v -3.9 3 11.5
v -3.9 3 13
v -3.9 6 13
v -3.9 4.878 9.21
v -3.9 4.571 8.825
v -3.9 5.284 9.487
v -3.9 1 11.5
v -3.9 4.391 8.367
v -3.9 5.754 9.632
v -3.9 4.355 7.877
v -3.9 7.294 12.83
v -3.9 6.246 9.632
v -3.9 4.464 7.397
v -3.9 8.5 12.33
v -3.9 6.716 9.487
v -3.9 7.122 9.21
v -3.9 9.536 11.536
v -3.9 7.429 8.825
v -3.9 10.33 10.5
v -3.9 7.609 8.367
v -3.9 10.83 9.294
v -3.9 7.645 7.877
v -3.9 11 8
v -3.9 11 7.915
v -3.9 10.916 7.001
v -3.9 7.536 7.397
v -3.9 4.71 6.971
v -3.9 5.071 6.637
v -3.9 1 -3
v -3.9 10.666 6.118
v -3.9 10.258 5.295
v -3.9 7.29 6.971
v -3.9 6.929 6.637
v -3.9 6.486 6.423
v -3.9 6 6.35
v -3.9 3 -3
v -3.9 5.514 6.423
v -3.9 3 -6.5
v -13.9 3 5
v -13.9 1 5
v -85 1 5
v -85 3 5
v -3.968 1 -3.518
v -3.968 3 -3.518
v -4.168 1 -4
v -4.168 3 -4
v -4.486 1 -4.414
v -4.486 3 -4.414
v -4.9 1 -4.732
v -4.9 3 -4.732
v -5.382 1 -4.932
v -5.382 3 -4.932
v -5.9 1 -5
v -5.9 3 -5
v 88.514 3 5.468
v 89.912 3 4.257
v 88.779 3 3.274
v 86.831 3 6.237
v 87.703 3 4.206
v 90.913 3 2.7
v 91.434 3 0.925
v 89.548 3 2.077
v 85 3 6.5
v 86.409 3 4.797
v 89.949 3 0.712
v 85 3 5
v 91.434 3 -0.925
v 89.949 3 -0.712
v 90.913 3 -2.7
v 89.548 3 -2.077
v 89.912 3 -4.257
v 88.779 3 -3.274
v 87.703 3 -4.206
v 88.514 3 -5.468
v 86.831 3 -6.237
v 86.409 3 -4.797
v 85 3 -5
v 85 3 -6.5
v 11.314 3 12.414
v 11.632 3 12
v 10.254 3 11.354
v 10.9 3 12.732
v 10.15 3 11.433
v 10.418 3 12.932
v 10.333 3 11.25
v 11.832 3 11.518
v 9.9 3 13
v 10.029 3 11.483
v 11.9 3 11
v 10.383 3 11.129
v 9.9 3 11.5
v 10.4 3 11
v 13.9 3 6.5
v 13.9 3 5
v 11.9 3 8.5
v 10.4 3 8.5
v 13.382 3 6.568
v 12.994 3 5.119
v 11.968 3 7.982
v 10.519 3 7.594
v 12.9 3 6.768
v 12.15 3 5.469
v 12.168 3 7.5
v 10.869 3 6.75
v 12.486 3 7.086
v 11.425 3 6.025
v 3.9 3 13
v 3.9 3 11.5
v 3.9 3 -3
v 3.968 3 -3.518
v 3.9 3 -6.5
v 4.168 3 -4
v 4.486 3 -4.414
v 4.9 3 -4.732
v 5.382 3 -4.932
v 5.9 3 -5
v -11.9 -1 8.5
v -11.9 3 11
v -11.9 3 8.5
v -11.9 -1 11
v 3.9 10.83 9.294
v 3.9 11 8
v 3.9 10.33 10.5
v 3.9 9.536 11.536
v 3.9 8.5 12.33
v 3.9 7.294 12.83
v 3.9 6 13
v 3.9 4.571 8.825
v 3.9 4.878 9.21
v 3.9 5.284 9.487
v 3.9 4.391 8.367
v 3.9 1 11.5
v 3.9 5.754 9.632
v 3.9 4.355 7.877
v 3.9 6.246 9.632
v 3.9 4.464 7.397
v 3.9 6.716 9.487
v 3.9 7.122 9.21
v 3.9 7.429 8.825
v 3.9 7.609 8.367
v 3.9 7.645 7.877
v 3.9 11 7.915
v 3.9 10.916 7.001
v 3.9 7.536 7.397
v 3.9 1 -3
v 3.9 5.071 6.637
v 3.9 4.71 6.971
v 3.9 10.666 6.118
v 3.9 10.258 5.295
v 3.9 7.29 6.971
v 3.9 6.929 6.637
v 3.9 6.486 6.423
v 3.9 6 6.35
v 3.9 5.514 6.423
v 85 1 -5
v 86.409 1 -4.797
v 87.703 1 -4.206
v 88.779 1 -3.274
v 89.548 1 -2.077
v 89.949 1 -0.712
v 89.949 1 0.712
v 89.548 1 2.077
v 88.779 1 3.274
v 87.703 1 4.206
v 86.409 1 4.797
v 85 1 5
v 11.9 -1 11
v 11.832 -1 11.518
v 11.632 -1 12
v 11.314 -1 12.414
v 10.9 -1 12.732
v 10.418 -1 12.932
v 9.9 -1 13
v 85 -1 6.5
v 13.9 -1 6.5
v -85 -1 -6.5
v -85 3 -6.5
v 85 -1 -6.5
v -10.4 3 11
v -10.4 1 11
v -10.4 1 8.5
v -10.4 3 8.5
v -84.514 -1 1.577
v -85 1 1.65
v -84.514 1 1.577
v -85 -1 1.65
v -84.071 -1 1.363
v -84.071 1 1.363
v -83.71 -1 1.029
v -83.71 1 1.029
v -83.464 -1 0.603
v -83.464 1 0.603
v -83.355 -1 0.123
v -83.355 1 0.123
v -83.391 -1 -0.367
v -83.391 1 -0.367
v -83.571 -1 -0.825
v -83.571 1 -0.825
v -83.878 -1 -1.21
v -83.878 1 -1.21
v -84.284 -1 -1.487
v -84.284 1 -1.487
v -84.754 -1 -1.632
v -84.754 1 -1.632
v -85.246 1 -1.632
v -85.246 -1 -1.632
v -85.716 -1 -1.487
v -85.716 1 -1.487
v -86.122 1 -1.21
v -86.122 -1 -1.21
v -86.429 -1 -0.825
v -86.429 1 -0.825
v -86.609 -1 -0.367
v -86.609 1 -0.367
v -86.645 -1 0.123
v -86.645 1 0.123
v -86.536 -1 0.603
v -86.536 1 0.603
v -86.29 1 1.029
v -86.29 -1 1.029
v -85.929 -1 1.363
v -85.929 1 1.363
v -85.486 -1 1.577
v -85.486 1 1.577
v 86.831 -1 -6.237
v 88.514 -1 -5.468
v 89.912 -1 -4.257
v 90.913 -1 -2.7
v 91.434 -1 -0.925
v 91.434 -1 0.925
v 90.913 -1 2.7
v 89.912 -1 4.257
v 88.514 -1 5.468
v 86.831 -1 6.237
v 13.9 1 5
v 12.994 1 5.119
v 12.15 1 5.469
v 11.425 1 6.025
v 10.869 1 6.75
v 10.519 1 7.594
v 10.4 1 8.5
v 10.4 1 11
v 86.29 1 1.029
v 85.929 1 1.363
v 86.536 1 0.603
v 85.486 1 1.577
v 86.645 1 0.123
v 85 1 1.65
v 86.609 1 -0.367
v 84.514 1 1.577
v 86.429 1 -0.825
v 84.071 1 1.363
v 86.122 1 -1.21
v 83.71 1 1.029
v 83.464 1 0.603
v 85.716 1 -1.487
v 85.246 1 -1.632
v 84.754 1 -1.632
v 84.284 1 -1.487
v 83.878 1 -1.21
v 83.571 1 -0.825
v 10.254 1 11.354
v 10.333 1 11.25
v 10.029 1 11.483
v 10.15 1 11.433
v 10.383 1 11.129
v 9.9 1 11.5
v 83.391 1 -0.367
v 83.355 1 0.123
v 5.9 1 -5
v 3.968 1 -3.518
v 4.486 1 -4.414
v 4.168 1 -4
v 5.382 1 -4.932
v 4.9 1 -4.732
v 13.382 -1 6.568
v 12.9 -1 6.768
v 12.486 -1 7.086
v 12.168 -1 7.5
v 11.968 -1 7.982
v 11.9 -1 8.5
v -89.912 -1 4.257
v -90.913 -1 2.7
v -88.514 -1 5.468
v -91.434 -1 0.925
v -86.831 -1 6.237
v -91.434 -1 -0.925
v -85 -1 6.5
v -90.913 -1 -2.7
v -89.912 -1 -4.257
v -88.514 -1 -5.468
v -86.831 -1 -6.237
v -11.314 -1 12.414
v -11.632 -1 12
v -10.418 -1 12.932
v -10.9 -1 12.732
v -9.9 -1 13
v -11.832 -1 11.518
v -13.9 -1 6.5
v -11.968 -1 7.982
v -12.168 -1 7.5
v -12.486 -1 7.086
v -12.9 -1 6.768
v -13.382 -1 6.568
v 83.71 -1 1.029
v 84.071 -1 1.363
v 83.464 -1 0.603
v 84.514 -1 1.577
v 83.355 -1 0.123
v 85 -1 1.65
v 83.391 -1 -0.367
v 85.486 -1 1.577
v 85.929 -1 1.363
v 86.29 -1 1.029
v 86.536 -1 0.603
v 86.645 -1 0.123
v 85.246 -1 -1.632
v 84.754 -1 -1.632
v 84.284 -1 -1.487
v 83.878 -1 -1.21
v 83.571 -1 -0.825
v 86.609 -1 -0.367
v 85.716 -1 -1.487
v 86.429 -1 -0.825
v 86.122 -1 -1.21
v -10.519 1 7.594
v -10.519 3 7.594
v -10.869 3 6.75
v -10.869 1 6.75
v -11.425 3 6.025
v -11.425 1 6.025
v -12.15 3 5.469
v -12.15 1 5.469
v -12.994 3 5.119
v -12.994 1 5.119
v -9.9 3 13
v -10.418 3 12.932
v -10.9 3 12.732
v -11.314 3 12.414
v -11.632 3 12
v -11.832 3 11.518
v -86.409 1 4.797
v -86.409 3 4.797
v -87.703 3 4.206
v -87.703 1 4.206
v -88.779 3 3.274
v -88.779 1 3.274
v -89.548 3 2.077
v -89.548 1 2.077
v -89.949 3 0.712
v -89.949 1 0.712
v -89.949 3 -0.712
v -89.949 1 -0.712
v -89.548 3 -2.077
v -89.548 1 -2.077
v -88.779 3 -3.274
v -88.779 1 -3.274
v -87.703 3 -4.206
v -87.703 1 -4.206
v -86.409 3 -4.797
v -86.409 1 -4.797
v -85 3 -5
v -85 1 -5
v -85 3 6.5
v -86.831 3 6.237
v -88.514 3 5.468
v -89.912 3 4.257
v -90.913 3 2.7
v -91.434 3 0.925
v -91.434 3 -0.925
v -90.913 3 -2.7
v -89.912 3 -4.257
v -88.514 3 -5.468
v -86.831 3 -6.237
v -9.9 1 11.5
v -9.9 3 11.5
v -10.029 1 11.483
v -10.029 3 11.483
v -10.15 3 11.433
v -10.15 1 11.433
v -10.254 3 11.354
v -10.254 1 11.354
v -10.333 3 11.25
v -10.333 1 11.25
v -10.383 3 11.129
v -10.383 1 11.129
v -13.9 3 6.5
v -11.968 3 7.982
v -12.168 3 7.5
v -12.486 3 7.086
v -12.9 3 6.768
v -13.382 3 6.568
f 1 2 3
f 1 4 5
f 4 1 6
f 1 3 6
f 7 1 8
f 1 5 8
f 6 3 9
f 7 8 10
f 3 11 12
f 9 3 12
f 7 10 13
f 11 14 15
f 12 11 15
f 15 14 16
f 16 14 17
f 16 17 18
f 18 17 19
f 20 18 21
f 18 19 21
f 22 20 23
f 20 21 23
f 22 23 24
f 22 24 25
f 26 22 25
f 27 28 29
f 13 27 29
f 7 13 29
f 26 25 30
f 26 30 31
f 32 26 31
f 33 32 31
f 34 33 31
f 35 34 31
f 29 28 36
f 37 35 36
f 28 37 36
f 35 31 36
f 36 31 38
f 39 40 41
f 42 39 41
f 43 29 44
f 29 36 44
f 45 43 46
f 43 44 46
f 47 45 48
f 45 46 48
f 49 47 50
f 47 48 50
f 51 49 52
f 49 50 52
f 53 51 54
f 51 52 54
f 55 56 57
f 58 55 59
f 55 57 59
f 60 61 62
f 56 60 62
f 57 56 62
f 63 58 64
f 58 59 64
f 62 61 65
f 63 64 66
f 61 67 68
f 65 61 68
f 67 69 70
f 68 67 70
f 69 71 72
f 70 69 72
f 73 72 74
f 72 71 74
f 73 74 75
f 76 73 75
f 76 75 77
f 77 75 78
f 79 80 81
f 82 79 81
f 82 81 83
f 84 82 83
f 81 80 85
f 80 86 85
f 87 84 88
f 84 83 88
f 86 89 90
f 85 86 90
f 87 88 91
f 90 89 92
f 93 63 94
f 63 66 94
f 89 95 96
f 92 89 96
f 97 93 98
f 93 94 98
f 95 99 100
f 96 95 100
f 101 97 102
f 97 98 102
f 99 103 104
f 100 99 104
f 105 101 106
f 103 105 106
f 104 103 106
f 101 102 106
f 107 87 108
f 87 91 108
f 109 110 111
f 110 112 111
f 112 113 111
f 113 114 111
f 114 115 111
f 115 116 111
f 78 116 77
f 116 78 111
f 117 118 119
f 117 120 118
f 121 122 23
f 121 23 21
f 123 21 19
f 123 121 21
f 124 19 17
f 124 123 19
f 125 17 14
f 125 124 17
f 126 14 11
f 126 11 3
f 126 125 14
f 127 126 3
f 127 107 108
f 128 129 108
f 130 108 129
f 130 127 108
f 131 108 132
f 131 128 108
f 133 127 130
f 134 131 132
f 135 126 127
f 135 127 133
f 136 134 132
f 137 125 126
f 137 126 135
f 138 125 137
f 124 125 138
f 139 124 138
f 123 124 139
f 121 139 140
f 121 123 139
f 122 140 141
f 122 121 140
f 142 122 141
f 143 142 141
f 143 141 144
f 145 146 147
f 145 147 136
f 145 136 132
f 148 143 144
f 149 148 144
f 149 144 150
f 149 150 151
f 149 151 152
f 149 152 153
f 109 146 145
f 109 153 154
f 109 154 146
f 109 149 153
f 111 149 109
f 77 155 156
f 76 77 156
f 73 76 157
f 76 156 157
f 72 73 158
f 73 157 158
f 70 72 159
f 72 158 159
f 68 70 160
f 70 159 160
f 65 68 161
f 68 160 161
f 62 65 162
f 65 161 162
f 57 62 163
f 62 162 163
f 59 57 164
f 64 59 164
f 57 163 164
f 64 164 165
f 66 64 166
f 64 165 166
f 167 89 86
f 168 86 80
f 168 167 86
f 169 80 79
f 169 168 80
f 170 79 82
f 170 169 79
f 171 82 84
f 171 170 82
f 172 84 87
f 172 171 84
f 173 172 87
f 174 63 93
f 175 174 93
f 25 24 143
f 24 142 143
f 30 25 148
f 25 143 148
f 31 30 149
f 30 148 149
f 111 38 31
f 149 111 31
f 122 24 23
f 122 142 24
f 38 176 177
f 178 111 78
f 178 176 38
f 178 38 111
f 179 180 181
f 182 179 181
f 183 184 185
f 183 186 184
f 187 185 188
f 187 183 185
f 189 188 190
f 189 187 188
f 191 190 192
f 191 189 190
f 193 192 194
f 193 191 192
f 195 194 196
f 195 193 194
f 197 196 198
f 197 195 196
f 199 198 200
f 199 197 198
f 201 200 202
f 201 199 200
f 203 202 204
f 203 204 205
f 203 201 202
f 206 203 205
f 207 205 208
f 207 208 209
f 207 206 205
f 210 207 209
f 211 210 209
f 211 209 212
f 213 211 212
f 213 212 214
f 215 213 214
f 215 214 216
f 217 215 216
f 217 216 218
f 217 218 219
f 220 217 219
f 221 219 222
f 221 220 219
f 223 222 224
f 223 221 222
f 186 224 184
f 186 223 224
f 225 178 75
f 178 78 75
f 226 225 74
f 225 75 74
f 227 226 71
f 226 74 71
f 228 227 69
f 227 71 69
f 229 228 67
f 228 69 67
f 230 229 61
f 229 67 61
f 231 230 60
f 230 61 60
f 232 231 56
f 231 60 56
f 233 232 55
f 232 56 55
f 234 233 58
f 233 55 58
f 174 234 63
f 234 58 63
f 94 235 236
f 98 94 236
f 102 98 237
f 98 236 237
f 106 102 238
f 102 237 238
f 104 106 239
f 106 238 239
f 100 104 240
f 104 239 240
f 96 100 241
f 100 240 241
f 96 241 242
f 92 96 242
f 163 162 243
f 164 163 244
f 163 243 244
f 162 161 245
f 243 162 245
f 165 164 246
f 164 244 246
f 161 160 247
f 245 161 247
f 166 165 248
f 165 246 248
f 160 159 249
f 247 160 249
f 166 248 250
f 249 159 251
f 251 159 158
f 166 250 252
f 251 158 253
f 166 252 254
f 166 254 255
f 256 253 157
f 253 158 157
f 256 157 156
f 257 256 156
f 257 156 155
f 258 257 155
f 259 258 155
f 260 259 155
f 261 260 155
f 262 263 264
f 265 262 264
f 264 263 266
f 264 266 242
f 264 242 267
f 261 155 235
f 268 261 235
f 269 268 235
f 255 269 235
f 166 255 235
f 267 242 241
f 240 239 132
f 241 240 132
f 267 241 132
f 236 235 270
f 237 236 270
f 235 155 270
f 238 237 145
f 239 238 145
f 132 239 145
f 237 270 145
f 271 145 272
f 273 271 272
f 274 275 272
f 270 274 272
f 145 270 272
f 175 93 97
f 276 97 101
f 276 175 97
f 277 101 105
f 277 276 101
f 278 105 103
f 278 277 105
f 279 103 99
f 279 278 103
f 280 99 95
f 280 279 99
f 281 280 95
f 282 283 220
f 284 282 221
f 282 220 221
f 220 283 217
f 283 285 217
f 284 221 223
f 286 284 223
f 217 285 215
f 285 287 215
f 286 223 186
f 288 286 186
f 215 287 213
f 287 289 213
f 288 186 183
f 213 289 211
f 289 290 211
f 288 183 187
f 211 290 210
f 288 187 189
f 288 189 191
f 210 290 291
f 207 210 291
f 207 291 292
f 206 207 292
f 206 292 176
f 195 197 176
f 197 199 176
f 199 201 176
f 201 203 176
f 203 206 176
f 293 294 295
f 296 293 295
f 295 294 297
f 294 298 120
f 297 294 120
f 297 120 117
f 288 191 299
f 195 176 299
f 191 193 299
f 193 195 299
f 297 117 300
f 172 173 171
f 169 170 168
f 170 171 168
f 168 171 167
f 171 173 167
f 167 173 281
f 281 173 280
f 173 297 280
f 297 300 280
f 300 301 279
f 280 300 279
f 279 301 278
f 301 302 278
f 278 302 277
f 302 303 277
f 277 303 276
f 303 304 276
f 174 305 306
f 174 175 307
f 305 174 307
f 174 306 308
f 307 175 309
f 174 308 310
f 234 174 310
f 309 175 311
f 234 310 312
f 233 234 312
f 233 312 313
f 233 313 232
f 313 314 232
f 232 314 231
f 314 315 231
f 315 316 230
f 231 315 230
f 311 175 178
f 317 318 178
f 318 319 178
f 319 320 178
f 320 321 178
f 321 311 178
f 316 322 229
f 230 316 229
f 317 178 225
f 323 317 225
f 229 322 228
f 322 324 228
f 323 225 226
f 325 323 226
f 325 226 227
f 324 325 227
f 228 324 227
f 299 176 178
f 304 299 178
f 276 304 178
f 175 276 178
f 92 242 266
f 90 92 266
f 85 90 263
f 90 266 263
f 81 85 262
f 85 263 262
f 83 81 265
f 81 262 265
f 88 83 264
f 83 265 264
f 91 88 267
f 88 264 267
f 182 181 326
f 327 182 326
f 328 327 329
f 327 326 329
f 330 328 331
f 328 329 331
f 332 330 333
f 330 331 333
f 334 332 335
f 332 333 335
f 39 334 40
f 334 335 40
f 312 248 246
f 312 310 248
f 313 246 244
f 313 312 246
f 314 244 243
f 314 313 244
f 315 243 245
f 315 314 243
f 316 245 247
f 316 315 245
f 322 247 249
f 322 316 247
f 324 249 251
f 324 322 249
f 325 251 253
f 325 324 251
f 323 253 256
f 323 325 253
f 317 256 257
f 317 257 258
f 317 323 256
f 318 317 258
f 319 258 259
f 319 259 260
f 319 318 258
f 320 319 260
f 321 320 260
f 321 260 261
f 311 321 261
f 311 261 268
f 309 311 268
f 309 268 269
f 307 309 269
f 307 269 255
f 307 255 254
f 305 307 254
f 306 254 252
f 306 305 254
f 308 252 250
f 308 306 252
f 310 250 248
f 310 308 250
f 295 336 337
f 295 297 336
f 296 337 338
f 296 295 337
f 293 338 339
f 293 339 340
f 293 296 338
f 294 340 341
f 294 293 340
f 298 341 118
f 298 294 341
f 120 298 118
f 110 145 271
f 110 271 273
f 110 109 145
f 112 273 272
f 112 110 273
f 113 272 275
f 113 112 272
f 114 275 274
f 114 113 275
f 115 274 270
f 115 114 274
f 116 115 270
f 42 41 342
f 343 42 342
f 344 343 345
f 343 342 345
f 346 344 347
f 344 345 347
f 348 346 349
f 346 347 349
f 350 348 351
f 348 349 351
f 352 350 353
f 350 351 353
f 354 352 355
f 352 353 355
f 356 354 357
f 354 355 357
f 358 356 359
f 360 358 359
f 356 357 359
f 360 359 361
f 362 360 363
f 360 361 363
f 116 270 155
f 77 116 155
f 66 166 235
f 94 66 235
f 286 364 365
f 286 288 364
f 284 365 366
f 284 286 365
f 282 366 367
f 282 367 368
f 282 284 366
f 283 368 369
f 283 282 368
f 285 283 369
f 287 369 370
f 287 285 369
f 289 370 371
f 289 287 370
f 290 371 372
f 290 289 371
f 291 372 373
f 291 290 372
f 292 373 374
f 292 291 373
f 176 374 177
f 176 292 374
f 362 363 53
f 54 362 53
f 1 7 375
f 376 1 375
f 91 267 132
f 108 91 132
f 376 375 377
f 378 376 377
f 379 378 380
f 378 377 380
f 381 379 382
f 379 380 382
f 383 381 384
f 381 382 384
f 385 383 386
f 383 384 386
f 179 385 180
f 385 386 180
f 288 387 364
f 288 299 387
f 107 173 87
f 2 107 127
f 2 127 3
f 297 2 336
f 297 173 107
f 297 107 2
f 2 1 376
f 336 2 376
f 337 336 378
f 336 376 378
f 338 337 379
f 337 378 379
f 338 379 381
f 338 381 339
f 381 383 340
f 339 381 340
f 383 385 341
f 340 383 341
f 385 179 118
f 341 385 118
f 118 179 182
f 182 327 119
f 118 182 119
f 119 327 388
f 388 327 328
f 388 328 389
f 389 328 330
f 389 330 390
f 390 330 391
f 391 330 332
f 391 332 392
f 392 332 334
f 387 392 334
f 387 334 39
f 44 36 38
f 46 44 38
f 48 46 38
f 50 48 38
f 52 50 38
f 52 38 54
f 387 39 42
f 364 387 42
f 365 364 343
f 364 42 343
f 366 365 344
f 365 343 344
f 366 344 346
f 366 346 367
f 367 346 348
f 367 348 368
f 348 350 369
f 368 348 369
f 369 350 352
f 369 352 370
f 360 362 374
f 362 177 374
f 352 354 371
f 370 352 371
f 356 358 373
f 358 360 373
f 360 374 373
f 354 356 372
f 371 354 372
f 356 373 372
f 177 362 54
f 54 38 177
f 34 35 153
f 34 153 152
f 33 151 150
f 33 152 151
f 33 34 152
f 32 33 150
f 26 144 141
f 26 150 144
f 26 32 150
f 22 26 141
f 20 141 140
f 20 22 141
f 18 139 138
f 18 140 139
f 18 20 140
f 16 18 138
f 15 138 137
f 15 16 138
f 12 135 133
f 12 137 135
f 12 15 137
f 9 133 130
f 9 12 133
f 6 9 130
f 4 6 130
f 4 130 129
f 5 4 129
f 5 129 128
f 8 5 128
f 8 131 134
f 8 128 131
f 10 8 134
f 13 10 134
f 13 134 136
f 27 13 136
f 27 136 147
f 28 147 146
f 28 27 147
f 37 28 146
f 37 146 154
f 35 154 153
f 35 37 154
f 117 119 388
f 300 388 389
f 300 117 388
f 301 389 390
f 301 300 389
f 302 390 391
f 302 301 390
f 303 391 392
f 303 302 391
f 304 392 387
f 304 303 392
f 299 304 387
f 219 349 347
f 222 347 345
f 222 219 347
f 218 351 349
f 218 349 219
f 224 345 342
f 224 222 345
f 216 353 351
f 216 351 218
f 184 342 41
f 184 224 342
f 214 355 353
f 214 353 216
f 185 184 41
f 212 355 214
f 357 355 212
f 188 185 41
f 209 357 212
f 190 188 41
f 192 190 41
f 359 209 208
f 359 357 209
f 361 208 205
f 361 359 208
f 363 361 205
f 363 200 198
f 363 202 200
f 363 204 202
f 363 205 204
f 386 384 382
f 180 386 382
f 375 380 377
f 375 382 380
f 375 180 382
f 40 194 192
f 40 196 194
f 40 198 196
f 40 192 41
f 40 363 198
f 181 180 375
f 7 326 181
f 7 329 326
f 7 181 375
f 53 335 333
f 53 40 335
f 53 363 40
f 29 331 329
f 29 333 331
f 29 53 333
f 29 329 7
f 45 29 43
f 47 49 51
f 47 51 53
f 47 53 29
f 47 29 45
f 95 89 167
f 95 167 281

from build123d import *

# Parameters (mm, degrees)
SKETCH1_R               = 1.65
BOSS_EXTRUDE1_DEPTH     = 1
SKETCH2_W               = 7.8
SKETCH2_H               = 13
BOSS_EXTRUDE2_DEPTH     = 10
BOSS_EXTRUDE3_DEPTH     = 7.8
CUT_EXTRUDE1_DEPTH      = 97.907997606
CUT_EXTRUDE1_DEPTH_BACK = 97.907997606
SKETCH4_R               = 1.65
SKETCH7_W               = 8
SKETCH7_H               = 6.5
BOSS_EXTRUDE5_DEPTH     = 2
FILLET3_R               = 2
BOSS_EXTRUDE4_DEPTH     = 2
CUT_EXTRUDE2_DEPTH      = 10
FILLET1_R               = 5
FILLET2_R               = 2


with BuildPart() as part:
    # Sketch1 → Boss-Extrude1 (new, symmetric)
    with BuildSketch(Plane(origin=(0, 0, 0), x_dir=(1, 0, 0), z_dir=(0, 1, 0))):
        with BuildLine():
            Line((-85, 6.5), (85, 6.5))
            ThreePointArc((85, 6.5), (91.5, 0), (85, -6.5))
            Line((85, -6.5), (-85, -6.5))
            ThreePointArc((-85, -6.5), (-91.5, 0), (-85, 6.5))
        make_face()
        with Locations(Location((-85, 0, 0), (0, 0, 270))):
            Circle(SKETCH1_R, mode=Mode.SUBTRACT)
        with Locations(Location((85, 0, 0), (0, 0, 270))):
            Circle(SKETCH1_R, mode=Mode.SUBTRACT)
    extrude(amount=BOSS_EXTRUDE1_DEPTH, both=True)

    # Sketch2 → Boss-Extrude2 (add)
    with BuildSketch(Plane(origin=(0, 1, 0), x_dir=(1, 0, 0), z_dir=(0, 1, 0))):
        Rectangle(SKETCH2_W, SKETCH2_H)
    extrude(amount=BOSS_EXTRUDE2_DEPTH)

    # Sketch3 → Boss-Extrude3 (add)
    with BuildSketch(Plane(origin=(3.9, 0, 0), x_dir=(0, 0, -1), z_dir=(1, 0, 0))):
        with BuildLine():
            Line((-6.5, 11), (-8, 11))
            ThreePointArc((-8, 11), (-11.535533906, 9.535533906), (-13, 6))
            Line((-13, 6), (-13, -1))
            Line((-13, -1), (-6.5, -1))
            Line((-6.5, -1), (-6.5, 11))
        make_face()
    extrude(amount=-BOSS_EXTRUDE3_DEPTH)

    # Sketch4 → Cut-Extrude1 (cut, two sides: drawn at the far end of the back side and taken through both)
    with BuildSketch(Plane(origin=(3.9, 0, 0), x_dir=(0, 0, -1), z_dir=(1, 0, 0)).offset(-CUT_EXTRUDE1_DEPTH_BACK)):
        with Locations((-8, 6)):
            Circle(SKETCH4_R)
    extrude(amount=CUT_EXTRUDE1_DEPTH + CUT_EXTRUDE1_DEPTH_BACK, mode=Mode.SUBTRACT)

    # Sketch7 → Boss-Extrude5 (add)
    with BuildSketch(Plane(origin=(0, 1, 0), x_dir=(1, 0, 0), z_dir=(0, 1, 0))):
        with Locations((-7.9, -9.75)):
            Rectangle(SKETCH7_W, SKETCH7_H)
        with Locations((7.9, -9.75)):
            Rectangle(SKETCH7_W, SKETCH7_H)
    extrude(amount=-BOSS_EXTRUDE5_DEPTH)

    # Fillet3
    fillet3_edges = [part.edges().sort_by_distance(p)[0] for p in [
        (-11.9, 0, 6.5),
        (-11.9, 0, 13),
        (11.9, 0, 6.5),
        (11.9, 0, 13),
    ]]
    fillet(fillet3_edges, radius=FILLET3_R)

    # Sketch5 → Boss-Extrude4 (add)
    with BuildSketch(Plane(origin=(0, 1, 0), x_dir=(1, 0, 0), z_dir=(0, 1, 0))):
        with BuildLine():
            Line((-85, 6.5), (85, 6.5))
            ThreePointArc((85, 6.5), (91.5, 0), (85, -6.5))
            Line((85, -6.5), (13.9, -6.5))
            ThreePointArc((13.9, -6.5), (12.485786438, -7.085786438), (11.9, -8.5))
            Line((11.9, -8.5), (11.9, -11))
            ThreePointArc((11.9, -11), (11.314213562, -12.414213562), (9.9, -13))
            Line((9.9, -13), (-9.9, -13))
            ThreePointArc((-9.9, -13), (-11.314213562, -12.414213562), (-11.9, -11))
            Line((-11.9, -11), (-11.9, -8.5))
            ThreePointArc((-11.9, -8.5), (-12.485786438, -7.085786438), (-13.9, -6.5))
            Line((-13.9, -6.5), (-85, -6.5))
            ThreePointArc((-85, -6.5), (-91.5, 0), (-85, 6.5))
        make_face()
        with BuildLine():
            Line((-85, 5), (85, 5))
            ThreePointArc((85, 5), (90, 0), (85, -5))
            Line((85, -5), (13.9, -5))
            ThreePointArc((13.9, -5), (11.425126266, -6.025126266), (10.4, -8.5))
            Line((10.4, -8.5), (10.4, -11))
            ThreePointArc((10.4, -11), (10.253553391, -11.353553391), (9.9, -11.5))
            Line((9.9, -11.5), (-9.9, -11.5))
            ThreePointArc((-9.9, -11.5), (-10.253553391, -11.353553391), (-10.4, -11))
            Line((-10.4, -11), (-10.4, -8.5))
            ThreePointArc((-10.4, -8.5), (-11.425126266, -6.025126266), (-13.9, -5))
            Line((-13.9, -5), (-85, -5))
            ThreePointArc((-85, -5), (-90, 0), (-85, 5))
        make_face(mode=Mode.SUBTRACT)
    extrude(amount=BOSS_EXTRUDE4_DEPTH)

    # Sketch6 → Cut-Extrude2 (cut)
    with BuildSketch(Plane.ZY.offset(3.9)):
        Polygon((-6.5, 3), (6.5, 11), (-6.5, 11), align=None)
    extrude(amount=-CUT_EXTRUDE2_DEPTH, mode=Mode.SUBTRACT)

    # Fillet1
    fillet1_edges = [part.edges().sort_by_distance(p)[0] for p in [
        (0, 11, 6.5),
    ]]
    fillet(fillet1_edges, radius=FILLET1_R)

    # Fillet2
    fillet2_edges = [part.edges().sort_by_distance(p)[0] for p in [
        (-3.9, 2, -5),
        (3.9, 2, -5),
    ]]
    fillet(fillet2_edges, radius=FILLET2_R)


solid = part.part
